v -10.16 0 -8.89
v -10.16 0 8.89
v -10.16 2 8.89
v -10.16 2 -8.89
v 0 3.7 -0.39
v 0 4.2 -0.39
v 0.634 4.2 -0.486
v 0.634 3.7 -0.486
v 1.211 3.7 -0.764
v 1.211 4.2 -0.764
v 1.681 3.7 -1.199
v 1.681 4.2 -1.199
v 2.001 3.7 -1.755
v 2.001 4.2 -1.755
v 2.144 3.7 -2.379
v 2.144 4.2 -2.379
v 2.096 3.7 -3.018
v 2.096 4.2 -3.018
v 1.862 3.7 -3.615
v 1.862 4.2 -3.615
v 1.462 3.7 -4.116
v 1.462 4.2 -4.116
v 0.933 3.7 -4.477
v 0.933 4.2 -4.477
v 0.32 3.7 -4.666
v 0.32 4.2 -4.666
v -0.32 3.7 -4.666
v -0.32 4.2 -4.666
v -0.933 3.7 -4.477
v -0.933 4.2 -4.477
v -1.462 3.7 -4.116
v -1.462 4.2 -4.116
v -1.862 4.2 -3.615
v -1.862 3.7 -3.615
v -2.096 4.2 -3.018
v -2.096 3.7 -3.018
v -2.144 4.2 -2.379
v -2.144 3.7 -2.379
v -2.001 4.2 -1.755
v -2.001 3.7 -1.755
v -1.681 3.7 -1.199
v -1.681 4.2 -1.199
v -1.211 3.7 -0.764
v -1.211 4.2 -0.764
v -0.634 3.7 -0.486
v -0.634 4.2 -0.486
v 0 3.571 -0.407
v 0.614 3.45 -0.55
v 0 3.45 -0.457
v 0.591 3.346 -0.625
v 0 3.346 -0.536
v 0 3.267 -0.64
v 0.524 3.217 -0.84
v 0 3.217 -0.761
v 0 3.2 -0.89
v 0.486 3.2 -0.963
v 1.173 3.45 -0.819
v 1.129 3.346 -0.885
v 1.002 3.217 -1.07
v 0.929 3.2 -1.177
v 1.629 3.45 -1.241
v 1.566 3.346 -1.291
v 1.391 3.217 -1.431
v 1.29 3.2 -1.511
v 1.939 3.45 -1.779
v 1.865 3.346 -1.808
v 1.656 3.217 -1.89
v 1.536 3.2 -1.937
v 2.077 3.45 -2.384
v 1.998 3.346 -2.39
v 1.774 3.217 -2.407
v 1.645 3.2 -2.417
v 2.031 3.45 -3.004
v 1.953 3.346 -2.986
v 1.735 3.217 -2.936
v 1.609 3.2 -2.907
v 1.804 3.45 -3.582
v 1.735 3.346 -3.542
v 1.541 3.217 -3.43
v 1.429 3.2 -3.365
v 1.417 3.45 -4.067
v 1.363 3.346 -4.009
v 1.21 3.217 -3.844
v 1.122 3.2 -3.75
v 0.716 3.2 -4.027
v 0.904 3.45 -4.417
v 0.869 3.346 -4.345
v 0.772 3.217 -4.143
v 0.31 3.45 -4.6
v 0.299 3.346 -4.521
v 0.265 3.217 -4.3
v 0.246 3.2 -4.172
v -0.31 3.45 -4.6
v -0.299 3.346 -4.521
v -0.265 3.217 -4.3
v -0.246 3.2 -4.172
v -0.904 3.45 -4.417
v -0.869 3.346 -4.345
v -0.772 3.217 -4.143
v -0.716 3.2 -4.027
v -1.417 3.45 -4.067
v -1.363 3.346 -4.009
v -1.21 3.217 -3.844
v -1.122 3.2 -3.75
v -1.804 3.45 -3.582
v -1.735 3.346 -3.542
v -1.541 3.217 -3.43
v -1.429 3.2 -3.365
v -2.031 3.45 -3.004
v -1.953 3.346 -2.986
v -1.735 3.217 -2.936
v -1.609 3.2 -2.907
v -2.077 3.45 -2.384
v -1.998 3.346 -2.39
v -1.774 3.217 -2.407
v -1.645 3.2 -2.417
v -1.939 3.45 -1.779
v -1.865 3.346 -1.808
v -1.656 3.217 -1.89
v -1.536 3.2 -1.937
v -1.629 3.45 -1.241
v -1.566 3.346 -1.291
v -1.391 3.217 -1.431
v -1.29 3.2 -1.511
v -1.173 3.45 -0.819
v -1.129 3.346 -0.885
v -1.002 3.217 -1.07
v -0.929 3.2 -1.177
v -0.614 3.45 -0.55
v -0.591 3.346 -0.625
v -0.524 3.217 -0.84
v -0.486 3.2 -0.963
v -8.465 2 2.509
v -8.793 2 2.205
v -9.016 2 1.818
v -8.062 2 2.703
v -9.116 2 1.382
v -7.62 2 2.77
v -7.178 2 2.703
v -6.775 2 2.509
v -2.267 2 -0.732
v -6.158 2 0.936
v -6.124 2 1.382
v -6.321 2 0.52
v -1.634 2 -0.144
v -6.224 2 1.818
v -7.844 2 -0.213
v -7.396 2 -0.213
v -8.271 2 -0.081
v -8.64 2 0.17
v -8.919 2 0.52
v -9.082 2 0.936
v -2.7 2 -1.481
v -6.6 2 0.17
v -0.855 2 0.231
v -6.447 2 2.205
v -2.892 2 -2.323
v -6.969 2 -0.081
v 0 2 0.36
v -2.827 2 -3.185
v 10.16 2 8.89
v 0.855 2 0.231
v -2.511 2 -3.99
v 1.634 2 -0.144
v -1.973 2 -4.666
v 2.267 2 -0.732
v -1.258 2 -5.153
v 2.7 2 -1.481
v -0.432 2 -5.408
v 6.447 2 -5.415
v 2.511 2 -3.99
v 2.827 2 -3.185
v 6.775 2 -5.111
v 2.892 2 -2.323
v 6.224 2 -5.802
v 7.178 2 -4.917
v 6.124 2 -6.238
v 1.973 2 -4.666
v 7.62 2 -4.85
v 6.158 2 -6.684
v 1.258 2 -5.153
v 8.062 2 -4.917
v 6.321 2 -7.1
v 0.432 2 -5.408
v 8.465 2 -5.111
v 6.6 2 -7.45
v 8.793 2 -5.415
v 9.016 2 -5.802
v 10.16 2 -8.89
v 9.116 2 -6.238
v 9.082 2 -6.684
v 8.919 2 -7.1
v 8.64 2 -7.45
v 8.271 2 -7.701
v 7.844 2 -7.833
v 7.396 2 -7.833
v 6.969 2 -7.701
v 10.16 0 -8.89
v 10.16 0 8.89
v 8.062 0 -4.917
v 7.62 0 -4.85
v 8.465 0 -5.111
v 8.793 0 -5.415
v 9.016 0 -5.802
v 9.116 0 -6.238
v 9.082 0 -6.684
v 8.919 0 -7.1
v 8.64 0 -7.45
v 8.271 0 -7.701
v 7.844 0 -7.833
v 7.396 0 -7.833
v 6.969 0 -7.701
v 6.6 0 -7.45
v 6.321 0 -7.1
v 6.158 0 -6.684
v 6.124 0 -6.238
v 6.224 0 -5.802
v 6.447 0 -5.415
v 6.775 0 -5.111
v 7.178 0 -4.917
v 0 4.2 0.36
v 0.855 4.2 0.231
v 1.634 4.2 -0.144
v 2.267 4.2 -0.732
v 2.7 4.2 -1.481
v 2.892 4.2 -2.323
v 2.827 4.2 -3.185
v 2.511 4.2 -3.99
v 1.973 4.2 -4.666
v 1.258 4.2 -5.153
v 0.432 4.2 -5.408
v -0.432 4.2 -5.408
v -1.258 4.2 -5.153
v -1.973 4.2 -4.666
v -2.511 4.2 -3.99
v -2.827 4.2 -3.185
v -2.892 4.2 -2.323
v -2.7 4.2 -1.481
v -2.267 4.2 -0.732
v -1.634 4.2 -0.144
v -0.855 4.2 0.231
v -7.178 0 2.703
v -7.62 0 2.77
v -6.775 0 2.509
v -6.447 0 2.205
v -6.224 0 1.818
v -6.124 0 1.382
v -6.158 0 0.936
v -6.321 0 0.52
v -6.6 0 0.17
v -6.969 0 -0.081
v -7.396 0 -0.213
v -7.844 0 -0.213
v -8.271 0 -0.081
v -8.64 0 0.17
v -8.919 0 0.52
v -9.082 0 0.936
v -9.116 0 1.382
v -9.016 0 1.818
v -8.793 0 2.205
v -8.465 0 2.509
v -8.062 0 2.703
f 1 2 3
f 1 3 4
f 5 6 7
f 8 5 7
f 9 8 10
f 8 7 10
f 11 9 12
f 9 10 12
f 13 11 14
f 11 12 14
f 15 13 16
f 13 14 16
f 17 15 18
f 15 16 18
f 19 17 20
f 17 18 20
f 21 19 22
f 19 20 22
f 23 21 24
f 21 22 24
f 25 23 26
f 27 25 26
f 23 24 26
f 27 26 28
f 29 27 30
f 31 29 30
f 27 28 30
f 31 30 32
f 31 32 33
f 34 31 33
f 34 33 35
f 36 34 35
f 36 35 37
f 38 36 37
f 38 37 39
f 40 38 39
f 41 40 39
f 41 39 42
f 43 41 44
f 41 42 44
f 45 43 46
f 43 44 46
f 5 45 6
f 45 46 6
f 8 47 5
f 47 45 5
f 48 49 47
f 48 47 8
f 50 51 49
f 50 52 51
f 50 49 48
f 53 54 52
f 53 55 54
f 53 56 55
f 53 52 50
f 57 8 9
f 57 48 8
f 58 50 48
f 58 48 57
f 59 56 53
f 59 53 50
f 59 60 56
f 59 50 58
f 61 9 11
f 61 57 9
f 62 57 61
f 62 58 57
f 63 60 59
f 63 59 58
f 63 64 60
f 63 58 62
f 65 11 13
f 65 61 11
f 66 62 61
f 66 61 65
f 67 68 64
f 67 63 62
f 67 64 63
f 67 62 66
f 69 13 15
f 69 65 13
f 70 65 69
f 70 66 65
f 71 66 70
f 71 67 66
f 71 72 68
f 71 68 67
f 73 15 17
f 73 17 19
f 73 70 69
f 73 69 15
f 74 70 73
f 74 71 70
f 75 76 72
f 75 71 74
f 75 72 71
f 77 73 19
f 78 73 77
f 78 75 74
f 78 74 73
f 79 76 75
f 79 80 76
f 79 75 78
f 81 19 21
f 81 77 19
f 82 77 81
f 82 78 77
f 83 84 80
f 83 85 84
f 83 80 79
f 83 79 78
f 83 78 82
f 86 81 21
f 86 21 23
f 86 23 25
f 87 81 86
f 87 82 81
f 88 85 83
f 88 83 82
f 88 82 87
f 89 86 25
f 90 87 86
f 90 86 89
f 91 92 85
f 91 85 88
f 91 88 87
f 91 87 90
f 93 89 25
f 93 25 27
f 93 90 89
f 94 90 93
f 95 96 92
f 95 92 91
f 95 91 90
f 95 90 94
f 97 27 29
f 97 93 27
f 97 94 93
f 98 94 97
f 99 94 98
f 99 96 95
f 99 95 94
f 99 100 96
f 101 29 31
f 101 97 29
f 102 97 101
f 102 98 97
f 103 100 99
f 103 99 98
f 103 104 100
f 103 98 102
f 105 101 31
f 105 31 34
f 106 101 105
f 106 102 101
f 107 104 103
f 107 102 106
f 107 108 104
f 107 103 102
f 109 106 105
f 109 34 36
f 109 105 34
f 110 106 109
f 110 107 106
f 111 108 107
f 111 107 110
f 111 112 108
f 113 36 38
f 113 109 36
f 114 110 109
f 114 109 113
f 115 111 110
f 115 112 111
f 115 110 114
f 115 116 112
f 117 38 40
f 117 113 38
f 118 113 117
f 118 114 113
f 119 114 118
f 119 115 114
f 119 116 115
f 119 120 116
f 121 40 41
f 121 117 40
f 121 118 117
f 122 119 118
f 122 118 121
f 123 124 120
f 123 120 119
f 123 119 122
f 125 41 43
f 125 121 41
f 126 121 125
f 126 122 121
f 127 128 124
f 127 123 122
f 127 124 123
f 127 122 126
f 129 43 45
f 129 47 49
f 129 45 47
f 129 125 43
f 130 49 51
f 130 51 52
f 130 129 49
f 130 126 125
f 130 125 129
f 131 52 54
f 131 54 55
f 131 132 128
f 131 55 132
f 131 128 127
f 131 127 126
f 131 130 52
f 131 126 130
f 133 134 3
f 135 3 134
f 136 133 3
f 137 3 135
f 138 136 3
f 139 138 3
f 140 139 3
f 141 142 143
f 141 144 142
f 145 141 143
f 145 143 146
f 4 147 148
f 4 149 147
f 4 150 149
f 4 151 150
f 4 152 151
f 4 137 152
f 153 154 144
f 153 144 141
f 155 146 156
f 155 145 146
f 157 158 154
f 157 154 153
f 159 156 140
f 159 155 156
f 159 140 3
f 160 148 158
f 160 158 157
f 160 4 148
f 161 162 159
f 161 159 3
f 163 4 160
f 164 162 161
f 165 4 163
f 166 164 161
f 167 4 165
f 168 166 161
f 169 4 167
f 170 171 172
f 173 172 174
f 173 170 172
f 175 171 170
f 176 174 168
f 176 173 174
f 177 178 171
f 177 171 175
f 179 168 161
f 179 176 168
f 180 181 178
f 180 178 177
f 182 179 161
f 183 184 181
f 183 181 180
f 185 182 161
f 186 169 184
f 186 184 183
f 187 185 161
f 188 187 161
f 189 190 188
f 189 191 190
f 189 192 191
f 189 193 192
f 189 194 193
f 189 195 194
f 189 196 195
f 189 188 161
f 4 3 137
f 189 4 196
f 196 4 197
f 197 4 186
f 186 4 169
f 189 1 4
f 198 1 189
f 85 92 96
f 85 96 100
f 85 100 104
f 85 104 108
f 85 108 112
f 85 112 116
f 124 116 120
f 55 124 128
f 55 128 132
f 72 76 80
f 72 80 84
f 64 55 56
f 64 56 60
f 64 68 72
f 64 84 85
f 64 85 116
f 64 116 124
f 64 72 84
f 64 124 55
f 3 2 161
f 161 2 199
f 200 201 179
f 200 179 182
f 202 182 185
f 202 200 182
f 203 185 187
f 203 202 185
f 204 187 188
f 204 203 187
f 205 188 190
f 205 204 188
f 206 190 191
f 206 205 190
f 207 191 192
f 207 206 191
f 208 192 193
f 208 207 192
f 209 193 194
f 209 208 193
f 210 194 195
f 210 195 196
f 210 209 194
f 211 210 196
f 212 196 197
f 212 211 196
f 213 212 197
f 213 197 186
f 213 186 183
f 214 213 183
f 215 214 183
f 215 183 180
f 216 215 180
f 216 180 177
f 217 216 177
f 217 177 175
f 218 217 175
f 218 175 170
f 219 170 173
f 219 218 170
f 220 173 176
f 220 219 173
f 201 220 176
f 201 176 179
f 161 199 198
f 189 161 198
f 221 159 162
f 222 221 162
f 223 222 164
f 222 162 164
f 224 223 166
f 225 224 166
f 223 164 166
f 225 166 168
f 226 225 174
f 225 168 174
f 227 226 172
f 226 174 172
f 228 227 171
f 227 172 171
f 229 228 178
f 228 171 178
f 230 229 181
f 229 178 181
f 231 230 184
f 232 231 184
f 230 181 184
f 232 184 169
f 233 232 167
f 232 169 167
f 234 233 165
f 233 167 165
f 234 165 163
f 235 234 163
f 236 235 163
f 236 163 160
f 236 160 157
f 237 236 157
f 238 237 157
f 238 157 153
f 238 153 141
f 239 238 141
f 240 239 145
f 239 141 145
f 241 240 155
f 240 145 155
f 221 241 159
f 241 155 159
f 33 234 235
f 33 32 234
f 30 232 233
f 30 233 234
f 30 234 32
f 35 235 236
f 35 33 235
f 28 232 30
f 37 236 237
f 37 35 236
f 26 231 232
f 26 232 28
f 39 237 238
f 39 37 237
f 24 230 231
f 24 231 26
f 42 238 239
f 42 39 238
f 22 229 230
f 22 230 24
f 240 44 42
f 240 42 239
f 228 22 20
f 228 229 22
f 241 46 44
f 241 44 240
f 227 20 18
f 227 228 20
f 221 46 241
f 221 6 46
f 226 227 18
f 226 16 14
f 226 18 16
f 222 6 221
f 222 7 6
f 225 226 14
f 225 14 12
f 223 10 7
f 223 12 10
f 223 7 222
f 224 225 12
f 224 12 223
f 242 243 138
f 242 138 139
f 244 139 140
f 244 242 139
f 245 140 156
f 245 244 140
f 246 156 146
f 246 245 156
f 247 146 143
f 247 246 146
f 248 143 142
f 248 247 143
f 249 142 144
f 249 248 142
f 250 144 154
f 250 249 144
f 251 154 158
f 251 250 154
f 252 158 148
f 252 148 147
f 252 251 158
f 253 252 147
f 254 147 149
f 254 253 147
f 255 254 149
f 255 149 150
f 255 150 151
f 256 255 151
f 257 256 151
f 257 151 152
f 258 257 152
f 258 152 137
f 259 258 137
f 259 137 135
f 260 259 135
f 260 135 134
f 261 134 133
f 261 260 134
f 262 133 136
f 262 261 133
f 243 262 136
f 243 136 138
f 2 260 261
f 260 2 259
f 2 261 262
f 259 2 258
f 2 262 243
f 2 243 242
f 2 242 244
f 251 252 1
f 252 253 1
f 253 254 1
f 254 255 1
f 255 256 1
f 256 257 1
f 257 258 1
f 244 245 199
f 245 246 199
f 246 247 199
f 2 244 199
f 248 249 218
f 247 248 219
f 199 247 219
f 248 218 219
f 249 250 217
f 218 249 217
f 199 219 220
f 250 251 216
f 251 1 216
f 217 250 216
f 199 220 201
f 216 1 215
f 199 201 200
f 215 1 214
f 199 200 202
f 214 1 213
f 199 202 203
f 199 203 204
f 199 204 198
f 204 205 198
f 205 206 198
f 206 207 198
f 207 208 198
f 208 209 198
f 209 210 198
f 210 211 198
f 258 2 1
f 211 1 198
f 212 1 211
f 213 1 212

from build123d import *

# Parameters (mm, degrees)
SKETCH2_W           = 20.32
SKETCH2_H           = 17.78
SKETCH2_R           = 1.5
BOSS_EXTRUDE1_DEPTH = 2
SKETCH3_R           = 2.9
BOSS_EXTRUDE2_DEPTH = 2.2
SKETCH4_R           = 2.15
CUT_EXTRUDE1_DEPTH  = 1
FILLET2_R           = 0.5


with BuildPart() as part:
    # Sketch2 → Boss-Extrude1 (new body)
    with BuildSketch(Plane(origin=(0, 0, 0), x_dir=(1, 0, 0), z_dir=(0, 1, 0))):
        Rectangle(SKETCH2_W, SKETCH2_H)
        with Locations(Location((7.62, 6.35, 0), (0, 0, 270))):
            Circle(SKETCH2_R, mode=Mode.SUBTRACT)
        with Locations(Location((-7.62, -1.27, 0), (0, 0, 270))):
            Circle(SKETCH2_R, mode=Mode.SUBTRACT)
    extrude(amount=BOSS_EXTRUDE1_DEPTH)

    # Sketch3 → Boss-Extrude2 (add)
    with BuildSketch(Plane(origin=(0, 2, 0), x_dir=(1, 0, 0), z_dir=(0, 1, 0))):
        with Locations(Location((0, 2.54, 0), (0, 0, 270))):
            Circle(SKETCH3_R)
    extrude(amount=BOSS_EXTRUDE2_DEPTH)

    # Sketch4 → Cut-Extrude1 (cut)
    with BuildSketch(Plane(origin=(0, 4.2, 0), x_dir=(1, 0, 0), z_dir=(0, 1, 0))):
        with Locations(Location((0, 2.54, 0), (0, 0, 270))):
            Circle(SKETCH4_R)
    extrude(amount=-CUT_EXTRUDE1_DEPTH, mode=Mode.SUBTRACT)

    # Fillet2
    fillet2_edges = [part.edges().sort_by_distance(p)[0] for p in [
        (0, 3.2, -4.69),
    ]]
    fillet(fillet2_edges, radius=FILLET2_R)


solid = part.part
